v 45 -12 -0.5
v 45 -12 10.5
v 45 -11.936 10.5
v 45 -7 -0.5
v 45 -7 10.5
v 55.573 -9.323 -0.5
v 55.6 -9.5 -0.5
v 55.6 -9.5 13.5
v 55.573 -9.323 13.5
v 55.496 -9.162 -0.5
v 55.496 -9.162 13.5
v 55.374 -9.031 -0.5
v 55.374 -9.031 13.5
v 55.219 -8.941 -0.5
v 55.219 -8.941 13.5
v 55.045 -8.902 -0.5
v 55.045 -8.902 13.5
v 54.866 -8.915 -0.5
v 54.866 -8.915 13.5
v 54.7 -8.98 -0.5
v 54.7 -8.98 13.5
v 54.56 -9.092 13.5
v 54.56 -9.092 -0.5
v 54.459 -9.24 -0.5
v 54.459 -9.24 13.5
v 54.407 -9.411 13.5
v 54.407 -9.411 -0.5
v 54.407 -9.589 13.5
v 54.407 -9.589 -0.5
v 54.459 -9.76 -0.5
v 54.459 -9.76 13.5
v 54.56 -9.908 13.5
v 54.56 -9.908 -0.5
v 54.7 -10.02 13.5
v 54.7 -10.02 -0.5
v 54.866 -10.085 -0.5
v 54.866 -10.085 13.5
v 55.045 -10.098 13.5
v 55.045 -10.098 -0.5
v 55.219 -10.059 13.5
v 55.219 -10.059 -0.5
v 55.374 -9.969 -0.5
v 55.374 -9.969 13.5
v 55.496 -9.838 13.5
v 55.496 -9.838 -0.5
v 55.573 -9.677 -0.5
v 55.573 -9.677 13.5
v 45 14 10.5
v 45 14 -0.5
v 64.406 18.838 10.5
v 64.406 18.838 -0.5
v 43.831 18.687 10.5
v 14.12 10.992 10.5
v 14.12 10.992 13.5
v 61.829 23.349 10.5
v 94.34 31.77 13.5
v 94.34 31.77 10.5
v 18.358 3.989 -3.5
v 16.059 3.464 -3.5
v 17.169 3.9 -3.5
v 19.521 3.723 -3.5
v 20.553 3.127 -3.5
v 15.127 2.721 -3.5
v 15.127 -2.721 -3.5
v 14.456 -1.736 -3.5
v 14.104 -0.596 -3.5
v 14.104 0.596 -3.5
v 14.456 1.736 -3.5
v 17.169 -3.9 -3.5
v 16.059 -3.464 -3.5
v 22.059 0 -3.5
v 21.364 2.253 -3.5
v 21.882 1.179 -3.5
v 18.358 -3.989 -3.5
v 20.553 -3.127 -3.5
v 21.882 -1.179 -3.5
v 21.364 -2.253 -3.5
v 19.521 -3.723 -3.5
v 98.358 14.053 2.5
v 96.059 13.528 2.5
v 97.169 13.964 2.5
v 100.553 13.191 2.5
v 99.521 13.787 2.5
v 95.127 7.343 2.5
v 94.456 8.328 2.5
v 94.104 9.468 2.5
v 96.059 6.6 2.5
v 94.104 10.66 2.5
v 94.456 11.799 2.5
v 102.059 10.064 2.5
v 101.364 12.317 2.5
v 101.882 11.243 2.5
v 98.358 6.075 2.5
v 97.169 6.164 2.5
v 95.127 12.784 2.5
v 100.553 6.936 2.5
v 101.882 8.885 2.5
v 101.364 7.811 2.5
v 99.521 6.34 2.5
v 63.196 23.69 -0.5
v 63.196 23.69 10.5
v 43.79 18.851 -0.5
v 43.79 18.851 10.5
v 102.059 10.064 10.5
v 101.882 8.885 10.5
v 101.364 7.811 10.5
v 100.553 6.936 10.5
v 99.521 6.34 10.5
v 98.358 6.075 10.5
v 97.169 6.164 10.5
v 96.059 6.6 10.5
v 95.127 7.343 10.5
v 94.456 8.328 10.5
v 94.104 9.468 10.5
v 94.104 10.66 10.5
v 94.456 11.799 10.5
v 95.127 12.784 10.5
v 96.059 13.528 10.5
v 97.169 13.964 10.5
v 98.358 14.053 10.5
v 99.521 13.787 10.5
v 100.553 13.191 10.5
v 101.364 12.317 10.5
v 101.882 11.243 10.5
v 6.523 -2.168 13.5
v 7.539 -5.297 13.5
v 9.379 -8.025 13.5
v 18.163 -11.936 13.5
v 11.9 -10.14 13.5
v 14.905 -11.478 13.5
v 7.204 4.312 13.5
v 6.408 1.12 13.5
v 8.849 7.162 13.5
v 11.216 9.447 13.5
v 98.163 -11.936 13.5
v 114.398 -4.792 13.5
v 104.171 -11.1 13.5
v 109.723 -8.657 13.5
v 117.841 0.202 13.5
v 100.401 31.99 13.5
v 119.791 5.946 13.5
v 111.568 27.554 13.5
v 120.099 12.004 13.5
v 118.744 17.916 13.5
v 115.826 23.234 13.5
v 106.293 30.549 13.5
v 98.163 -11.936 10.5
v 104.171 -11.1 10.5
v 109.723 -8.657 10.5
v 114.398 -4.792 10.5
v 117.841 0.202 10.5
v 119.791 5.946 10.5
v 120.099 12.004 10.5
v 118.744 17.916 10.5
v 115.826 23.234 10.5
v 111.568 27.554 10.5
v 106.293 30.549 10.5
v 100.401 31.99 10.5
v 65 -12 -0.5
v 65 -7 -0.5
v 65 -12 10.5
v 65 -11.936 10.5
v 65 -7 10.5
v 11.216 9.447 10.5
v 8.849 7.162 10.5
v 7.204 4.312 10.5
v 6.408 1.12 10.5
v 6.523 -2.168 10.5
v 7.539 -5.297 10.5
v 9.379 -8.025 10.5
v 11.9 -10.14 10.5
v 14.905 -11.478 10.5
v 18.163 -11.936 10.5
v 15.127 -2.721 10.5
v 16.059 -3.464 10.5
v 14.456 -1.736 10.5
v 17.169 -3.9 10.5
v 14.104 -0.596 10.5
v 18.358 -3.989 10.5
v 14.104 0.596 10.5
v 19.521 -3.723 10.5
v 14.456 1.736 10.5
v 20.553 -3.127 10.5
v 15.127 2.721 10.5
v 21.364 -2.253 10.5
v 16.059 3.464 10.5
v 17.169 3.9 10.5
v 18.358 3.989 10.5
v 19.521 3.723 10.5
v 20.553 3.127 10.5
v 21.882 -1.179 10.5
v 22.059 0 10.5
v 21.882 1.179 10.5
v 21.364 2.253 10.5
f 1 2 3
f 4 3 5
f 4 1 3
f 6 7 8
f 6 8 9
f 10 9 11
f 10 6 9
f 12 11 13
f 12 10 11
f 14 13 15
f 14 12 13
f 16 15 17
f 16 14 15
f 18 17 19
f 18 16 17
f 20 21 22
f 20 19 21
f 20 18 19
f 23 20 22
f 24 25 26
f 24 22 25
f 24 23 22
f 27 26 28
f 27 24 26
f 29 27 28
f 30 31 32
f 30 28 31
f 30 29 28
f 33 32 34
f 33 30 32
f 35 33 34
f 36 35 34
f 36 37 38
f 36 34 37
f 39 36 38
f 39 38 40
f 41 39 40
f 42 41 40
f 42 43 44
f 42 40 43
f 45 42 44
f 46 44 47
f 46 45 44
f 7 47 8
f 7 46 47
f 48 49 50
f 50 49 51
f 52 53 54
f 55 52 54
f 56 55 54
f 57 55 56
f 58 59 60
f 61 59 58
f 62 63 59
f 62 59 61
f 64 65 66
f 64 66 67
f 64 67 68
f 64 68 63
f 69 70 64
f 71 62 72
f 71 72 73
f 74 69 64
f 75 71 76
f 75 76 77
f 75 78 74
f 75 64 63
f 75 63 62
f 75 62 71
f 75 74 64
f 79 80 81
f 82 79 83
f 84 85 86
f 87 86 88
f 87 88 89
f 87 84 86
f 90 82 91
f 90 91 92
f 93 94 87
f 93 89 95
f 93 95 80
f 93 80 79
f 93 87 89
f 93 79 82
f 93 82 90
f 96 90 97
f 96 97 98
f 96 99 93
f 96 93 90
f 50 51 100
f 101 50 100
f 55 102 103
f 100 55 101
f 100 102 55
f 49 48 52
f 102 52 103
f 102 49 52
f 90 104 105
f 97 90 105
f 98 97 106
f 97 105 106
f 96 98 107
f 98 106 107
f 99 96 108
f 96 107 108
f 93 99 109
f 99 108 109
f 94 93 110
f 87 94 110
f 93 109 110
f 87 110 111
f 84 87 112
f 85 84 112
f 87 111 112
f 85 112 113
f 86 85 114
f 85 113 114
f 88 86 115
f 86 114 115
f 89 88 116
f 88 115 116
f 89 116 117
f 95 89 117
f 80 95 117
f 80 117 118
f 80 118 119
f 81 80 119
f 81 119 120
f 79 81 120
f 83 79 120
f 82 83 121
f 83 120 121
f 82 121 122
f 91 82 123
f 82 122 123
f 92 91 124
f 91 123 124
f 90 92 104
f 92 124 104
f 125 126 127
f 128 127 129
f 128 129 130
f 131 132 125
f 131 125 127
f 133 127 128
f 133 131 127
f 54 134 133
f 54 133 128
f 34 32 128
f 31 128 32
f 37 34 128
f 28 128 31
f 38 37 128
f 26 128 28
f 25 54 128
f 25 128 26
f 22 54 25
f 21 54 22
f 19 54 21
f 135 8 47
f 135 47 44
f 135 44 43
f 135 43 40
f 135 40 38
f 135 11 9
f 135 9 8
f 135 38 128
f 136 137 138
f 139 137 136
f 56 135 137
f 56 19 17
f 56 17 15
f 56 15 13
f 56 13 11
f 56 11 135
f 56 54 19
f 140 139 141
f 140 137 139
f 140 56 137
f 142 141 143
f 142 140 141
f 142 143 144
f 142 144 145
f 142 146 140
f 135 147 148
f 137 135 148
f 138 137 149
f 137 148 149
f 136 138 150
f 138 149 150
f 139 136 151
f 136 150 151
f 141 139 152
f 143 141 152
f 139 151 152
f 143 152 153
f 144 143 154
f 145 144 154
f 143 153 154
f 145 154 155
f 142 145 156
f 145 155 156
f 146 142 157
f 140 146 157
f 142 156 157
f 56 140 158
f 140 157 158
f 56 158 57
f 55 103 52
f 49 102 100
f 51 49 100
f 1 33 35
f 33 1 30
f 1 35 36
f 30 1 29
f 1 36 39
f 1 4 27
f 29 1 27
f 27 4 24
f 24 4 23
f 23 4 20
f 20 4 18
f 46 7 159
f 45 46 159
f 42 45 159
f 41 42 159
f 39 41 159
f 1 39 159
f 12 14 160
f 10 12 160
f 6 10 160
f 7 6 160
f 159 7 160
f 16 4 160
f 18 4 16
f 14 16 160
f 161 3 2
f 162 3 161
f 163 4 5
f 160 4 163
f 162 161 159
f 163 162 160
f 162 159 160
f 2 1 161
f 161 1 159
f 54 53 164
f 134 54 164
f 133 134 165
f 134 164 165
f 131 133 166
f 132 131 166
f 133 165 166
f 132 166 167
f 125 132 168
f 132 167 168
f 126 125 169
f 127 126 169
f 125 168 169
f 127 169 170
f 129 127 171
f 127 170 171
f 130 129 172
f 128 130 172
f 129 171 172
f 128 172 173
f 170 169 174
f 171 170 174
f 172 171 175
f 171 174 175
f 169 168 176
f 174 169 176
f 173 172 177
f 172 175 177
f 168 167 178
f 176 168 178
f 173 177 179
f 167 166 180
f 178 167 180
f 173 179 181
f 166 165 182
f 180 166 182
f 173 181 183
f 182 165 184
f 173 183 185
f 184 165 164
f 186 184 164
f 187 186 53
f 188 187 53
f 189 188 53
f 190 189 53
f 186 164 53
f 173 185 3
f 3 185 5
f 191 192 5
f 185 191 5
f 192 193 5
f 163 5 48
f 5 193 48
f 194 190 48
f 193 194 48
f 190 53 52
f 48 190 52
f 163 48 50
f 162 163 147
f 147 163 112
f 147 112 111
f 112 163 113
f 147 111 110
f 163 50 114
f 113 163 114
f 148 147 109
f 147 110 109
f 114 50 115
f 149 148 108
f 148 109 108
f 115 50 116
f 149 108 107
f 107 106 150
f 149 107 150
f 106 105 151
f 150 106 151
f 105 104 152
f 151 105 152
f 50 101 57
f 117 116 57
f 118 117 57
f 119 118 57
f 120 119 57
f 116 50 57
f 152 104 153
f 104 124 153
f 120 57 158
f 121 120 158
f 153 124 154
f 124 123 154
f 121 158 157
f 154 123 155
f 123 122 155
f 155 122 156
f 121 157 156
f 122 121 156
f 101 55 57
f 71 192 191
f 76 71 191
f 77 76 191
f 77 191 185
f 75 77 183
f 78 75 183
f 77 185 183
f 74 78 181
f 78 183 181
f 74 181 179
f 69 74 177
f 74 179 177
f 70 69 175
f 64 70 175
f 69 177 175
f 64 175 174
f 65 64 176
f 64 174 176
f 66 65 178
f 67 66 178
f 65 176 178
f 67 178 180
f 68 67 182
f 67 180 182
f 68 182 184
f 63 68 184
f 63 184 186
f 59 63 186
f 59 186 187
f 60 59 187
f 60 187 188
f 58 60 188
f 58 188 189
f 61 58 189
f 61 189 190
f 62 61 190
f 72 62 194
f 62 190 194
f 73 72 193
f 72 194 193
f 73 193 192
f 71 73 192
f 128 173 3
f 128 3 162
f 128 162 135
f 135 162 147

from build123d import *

# Parameters (mm, degrees)
CYLINDER011_R          = 0.6
CYLINDER011_DEPTH      = 20
BOX010_W               = 20
BOX010_H               = 5
BOX010_DEPTH           = 11
PAD001_DEPTH           = 3
SKETCH005_R            = 4
PAD002_DEPTH           = 8
SKETCH006_R            = 4
PAD003_DEPTH           = 14
BOX009_W               = 20
BOX009_H               = 5
BOX009_DEPTH           = 11
BOX009_PLACEMENT_ANGLE = 14


with BuildPart() as cylinder046:
    # Cylinder011 → Cylinder011 (new body)
    with BuildSketch(Plane(origin=(55, -9.5, -5), x_dir=(1, 0, 0), z_dir=(0, 0, 1))):
        Circle(CYLINDER011_R)
    extrude(amount=CYLINDER011_DEPTH)


with BuildPart() as cube010:
    # Box010 → Box010 (new body)
    with BuildSketch(Plane(origin=(45, -12, -0.5), x_dir=(1, 0, 0), z_dir=(0, 0, 1))):
        with Locations((10, 2.5)):
            Rectangle(BOX010_W, BOX010_H)
    extrude(amount=BOX010_DEPTH)


with BuildPart() as pad003:
    # Sketch004 → Pad001 (new body)
    with BuildSketch(Plane.XY.offset(10.5)):
        with BuildLine():
            ThreePointArc((14.120466, 10.991566), (6.522754, -2.168145), (18.163211, -11.935589))
            Line((18.163211, -11.935589), (98.163211, -11.935589))
            ThreePointArc((98.163211, -11.935589), (120.099455, 12.003546), (94.339546, 31.769884))
            Line((14.120466, 10.991566), (94.339546, 31.769884))
        make_face()
    extrude(amount=PAD001_DEPTH)

    # Sketch005 → Pad002 (new body)
    with BuildSketch(Plane(origin=(0, 0, 10.5), x_dir=(1, 0, 0), z_dir=(0, 0, -1))):
        with Locations((98.0594, -10.0638)):
            Circle(SKETCH005_R)
    extrude(amount=PAD002_DEPTH)

    # Sketch006 → Pad003 (new body)
    with BuildSketch(Plane(origin=(0, 0, 10.5), x_dir=(1, 0, 0), z_dir=(0, 0, -1))):
        with Locations((18.0594, 0)):
            Circle(SKETCH006_R)
    extrude(amount=PAD003_DEPTH)


with BuildPart() as cut010:
    # Box009 → Box009 (new body)
    with BuildSketch(Plane.XY):
        with Locations((10, 2.5)):
            Rectangle(BOX009_W, BOX009_H)
    extrude(amount=BOX009_DEPTH)


with BuildPart() as cut010_1:
    # Box009 placement: moved
    add(cut010.part.moved(Location((45, 14, -0.5))).rotate(Axis((45, 14, -0.5), (0, 0, 1)), BOX009_PLACEMENT_ANGLE))

    # Fusion005: union Cube010, Pad003
    add(cube010.part)
    add(pad003.part)

    # Cut010: cut Cylinder046
    add(cylinder046.part, mode=Mode.SUBTRACT)


solid = cut010_1.part
